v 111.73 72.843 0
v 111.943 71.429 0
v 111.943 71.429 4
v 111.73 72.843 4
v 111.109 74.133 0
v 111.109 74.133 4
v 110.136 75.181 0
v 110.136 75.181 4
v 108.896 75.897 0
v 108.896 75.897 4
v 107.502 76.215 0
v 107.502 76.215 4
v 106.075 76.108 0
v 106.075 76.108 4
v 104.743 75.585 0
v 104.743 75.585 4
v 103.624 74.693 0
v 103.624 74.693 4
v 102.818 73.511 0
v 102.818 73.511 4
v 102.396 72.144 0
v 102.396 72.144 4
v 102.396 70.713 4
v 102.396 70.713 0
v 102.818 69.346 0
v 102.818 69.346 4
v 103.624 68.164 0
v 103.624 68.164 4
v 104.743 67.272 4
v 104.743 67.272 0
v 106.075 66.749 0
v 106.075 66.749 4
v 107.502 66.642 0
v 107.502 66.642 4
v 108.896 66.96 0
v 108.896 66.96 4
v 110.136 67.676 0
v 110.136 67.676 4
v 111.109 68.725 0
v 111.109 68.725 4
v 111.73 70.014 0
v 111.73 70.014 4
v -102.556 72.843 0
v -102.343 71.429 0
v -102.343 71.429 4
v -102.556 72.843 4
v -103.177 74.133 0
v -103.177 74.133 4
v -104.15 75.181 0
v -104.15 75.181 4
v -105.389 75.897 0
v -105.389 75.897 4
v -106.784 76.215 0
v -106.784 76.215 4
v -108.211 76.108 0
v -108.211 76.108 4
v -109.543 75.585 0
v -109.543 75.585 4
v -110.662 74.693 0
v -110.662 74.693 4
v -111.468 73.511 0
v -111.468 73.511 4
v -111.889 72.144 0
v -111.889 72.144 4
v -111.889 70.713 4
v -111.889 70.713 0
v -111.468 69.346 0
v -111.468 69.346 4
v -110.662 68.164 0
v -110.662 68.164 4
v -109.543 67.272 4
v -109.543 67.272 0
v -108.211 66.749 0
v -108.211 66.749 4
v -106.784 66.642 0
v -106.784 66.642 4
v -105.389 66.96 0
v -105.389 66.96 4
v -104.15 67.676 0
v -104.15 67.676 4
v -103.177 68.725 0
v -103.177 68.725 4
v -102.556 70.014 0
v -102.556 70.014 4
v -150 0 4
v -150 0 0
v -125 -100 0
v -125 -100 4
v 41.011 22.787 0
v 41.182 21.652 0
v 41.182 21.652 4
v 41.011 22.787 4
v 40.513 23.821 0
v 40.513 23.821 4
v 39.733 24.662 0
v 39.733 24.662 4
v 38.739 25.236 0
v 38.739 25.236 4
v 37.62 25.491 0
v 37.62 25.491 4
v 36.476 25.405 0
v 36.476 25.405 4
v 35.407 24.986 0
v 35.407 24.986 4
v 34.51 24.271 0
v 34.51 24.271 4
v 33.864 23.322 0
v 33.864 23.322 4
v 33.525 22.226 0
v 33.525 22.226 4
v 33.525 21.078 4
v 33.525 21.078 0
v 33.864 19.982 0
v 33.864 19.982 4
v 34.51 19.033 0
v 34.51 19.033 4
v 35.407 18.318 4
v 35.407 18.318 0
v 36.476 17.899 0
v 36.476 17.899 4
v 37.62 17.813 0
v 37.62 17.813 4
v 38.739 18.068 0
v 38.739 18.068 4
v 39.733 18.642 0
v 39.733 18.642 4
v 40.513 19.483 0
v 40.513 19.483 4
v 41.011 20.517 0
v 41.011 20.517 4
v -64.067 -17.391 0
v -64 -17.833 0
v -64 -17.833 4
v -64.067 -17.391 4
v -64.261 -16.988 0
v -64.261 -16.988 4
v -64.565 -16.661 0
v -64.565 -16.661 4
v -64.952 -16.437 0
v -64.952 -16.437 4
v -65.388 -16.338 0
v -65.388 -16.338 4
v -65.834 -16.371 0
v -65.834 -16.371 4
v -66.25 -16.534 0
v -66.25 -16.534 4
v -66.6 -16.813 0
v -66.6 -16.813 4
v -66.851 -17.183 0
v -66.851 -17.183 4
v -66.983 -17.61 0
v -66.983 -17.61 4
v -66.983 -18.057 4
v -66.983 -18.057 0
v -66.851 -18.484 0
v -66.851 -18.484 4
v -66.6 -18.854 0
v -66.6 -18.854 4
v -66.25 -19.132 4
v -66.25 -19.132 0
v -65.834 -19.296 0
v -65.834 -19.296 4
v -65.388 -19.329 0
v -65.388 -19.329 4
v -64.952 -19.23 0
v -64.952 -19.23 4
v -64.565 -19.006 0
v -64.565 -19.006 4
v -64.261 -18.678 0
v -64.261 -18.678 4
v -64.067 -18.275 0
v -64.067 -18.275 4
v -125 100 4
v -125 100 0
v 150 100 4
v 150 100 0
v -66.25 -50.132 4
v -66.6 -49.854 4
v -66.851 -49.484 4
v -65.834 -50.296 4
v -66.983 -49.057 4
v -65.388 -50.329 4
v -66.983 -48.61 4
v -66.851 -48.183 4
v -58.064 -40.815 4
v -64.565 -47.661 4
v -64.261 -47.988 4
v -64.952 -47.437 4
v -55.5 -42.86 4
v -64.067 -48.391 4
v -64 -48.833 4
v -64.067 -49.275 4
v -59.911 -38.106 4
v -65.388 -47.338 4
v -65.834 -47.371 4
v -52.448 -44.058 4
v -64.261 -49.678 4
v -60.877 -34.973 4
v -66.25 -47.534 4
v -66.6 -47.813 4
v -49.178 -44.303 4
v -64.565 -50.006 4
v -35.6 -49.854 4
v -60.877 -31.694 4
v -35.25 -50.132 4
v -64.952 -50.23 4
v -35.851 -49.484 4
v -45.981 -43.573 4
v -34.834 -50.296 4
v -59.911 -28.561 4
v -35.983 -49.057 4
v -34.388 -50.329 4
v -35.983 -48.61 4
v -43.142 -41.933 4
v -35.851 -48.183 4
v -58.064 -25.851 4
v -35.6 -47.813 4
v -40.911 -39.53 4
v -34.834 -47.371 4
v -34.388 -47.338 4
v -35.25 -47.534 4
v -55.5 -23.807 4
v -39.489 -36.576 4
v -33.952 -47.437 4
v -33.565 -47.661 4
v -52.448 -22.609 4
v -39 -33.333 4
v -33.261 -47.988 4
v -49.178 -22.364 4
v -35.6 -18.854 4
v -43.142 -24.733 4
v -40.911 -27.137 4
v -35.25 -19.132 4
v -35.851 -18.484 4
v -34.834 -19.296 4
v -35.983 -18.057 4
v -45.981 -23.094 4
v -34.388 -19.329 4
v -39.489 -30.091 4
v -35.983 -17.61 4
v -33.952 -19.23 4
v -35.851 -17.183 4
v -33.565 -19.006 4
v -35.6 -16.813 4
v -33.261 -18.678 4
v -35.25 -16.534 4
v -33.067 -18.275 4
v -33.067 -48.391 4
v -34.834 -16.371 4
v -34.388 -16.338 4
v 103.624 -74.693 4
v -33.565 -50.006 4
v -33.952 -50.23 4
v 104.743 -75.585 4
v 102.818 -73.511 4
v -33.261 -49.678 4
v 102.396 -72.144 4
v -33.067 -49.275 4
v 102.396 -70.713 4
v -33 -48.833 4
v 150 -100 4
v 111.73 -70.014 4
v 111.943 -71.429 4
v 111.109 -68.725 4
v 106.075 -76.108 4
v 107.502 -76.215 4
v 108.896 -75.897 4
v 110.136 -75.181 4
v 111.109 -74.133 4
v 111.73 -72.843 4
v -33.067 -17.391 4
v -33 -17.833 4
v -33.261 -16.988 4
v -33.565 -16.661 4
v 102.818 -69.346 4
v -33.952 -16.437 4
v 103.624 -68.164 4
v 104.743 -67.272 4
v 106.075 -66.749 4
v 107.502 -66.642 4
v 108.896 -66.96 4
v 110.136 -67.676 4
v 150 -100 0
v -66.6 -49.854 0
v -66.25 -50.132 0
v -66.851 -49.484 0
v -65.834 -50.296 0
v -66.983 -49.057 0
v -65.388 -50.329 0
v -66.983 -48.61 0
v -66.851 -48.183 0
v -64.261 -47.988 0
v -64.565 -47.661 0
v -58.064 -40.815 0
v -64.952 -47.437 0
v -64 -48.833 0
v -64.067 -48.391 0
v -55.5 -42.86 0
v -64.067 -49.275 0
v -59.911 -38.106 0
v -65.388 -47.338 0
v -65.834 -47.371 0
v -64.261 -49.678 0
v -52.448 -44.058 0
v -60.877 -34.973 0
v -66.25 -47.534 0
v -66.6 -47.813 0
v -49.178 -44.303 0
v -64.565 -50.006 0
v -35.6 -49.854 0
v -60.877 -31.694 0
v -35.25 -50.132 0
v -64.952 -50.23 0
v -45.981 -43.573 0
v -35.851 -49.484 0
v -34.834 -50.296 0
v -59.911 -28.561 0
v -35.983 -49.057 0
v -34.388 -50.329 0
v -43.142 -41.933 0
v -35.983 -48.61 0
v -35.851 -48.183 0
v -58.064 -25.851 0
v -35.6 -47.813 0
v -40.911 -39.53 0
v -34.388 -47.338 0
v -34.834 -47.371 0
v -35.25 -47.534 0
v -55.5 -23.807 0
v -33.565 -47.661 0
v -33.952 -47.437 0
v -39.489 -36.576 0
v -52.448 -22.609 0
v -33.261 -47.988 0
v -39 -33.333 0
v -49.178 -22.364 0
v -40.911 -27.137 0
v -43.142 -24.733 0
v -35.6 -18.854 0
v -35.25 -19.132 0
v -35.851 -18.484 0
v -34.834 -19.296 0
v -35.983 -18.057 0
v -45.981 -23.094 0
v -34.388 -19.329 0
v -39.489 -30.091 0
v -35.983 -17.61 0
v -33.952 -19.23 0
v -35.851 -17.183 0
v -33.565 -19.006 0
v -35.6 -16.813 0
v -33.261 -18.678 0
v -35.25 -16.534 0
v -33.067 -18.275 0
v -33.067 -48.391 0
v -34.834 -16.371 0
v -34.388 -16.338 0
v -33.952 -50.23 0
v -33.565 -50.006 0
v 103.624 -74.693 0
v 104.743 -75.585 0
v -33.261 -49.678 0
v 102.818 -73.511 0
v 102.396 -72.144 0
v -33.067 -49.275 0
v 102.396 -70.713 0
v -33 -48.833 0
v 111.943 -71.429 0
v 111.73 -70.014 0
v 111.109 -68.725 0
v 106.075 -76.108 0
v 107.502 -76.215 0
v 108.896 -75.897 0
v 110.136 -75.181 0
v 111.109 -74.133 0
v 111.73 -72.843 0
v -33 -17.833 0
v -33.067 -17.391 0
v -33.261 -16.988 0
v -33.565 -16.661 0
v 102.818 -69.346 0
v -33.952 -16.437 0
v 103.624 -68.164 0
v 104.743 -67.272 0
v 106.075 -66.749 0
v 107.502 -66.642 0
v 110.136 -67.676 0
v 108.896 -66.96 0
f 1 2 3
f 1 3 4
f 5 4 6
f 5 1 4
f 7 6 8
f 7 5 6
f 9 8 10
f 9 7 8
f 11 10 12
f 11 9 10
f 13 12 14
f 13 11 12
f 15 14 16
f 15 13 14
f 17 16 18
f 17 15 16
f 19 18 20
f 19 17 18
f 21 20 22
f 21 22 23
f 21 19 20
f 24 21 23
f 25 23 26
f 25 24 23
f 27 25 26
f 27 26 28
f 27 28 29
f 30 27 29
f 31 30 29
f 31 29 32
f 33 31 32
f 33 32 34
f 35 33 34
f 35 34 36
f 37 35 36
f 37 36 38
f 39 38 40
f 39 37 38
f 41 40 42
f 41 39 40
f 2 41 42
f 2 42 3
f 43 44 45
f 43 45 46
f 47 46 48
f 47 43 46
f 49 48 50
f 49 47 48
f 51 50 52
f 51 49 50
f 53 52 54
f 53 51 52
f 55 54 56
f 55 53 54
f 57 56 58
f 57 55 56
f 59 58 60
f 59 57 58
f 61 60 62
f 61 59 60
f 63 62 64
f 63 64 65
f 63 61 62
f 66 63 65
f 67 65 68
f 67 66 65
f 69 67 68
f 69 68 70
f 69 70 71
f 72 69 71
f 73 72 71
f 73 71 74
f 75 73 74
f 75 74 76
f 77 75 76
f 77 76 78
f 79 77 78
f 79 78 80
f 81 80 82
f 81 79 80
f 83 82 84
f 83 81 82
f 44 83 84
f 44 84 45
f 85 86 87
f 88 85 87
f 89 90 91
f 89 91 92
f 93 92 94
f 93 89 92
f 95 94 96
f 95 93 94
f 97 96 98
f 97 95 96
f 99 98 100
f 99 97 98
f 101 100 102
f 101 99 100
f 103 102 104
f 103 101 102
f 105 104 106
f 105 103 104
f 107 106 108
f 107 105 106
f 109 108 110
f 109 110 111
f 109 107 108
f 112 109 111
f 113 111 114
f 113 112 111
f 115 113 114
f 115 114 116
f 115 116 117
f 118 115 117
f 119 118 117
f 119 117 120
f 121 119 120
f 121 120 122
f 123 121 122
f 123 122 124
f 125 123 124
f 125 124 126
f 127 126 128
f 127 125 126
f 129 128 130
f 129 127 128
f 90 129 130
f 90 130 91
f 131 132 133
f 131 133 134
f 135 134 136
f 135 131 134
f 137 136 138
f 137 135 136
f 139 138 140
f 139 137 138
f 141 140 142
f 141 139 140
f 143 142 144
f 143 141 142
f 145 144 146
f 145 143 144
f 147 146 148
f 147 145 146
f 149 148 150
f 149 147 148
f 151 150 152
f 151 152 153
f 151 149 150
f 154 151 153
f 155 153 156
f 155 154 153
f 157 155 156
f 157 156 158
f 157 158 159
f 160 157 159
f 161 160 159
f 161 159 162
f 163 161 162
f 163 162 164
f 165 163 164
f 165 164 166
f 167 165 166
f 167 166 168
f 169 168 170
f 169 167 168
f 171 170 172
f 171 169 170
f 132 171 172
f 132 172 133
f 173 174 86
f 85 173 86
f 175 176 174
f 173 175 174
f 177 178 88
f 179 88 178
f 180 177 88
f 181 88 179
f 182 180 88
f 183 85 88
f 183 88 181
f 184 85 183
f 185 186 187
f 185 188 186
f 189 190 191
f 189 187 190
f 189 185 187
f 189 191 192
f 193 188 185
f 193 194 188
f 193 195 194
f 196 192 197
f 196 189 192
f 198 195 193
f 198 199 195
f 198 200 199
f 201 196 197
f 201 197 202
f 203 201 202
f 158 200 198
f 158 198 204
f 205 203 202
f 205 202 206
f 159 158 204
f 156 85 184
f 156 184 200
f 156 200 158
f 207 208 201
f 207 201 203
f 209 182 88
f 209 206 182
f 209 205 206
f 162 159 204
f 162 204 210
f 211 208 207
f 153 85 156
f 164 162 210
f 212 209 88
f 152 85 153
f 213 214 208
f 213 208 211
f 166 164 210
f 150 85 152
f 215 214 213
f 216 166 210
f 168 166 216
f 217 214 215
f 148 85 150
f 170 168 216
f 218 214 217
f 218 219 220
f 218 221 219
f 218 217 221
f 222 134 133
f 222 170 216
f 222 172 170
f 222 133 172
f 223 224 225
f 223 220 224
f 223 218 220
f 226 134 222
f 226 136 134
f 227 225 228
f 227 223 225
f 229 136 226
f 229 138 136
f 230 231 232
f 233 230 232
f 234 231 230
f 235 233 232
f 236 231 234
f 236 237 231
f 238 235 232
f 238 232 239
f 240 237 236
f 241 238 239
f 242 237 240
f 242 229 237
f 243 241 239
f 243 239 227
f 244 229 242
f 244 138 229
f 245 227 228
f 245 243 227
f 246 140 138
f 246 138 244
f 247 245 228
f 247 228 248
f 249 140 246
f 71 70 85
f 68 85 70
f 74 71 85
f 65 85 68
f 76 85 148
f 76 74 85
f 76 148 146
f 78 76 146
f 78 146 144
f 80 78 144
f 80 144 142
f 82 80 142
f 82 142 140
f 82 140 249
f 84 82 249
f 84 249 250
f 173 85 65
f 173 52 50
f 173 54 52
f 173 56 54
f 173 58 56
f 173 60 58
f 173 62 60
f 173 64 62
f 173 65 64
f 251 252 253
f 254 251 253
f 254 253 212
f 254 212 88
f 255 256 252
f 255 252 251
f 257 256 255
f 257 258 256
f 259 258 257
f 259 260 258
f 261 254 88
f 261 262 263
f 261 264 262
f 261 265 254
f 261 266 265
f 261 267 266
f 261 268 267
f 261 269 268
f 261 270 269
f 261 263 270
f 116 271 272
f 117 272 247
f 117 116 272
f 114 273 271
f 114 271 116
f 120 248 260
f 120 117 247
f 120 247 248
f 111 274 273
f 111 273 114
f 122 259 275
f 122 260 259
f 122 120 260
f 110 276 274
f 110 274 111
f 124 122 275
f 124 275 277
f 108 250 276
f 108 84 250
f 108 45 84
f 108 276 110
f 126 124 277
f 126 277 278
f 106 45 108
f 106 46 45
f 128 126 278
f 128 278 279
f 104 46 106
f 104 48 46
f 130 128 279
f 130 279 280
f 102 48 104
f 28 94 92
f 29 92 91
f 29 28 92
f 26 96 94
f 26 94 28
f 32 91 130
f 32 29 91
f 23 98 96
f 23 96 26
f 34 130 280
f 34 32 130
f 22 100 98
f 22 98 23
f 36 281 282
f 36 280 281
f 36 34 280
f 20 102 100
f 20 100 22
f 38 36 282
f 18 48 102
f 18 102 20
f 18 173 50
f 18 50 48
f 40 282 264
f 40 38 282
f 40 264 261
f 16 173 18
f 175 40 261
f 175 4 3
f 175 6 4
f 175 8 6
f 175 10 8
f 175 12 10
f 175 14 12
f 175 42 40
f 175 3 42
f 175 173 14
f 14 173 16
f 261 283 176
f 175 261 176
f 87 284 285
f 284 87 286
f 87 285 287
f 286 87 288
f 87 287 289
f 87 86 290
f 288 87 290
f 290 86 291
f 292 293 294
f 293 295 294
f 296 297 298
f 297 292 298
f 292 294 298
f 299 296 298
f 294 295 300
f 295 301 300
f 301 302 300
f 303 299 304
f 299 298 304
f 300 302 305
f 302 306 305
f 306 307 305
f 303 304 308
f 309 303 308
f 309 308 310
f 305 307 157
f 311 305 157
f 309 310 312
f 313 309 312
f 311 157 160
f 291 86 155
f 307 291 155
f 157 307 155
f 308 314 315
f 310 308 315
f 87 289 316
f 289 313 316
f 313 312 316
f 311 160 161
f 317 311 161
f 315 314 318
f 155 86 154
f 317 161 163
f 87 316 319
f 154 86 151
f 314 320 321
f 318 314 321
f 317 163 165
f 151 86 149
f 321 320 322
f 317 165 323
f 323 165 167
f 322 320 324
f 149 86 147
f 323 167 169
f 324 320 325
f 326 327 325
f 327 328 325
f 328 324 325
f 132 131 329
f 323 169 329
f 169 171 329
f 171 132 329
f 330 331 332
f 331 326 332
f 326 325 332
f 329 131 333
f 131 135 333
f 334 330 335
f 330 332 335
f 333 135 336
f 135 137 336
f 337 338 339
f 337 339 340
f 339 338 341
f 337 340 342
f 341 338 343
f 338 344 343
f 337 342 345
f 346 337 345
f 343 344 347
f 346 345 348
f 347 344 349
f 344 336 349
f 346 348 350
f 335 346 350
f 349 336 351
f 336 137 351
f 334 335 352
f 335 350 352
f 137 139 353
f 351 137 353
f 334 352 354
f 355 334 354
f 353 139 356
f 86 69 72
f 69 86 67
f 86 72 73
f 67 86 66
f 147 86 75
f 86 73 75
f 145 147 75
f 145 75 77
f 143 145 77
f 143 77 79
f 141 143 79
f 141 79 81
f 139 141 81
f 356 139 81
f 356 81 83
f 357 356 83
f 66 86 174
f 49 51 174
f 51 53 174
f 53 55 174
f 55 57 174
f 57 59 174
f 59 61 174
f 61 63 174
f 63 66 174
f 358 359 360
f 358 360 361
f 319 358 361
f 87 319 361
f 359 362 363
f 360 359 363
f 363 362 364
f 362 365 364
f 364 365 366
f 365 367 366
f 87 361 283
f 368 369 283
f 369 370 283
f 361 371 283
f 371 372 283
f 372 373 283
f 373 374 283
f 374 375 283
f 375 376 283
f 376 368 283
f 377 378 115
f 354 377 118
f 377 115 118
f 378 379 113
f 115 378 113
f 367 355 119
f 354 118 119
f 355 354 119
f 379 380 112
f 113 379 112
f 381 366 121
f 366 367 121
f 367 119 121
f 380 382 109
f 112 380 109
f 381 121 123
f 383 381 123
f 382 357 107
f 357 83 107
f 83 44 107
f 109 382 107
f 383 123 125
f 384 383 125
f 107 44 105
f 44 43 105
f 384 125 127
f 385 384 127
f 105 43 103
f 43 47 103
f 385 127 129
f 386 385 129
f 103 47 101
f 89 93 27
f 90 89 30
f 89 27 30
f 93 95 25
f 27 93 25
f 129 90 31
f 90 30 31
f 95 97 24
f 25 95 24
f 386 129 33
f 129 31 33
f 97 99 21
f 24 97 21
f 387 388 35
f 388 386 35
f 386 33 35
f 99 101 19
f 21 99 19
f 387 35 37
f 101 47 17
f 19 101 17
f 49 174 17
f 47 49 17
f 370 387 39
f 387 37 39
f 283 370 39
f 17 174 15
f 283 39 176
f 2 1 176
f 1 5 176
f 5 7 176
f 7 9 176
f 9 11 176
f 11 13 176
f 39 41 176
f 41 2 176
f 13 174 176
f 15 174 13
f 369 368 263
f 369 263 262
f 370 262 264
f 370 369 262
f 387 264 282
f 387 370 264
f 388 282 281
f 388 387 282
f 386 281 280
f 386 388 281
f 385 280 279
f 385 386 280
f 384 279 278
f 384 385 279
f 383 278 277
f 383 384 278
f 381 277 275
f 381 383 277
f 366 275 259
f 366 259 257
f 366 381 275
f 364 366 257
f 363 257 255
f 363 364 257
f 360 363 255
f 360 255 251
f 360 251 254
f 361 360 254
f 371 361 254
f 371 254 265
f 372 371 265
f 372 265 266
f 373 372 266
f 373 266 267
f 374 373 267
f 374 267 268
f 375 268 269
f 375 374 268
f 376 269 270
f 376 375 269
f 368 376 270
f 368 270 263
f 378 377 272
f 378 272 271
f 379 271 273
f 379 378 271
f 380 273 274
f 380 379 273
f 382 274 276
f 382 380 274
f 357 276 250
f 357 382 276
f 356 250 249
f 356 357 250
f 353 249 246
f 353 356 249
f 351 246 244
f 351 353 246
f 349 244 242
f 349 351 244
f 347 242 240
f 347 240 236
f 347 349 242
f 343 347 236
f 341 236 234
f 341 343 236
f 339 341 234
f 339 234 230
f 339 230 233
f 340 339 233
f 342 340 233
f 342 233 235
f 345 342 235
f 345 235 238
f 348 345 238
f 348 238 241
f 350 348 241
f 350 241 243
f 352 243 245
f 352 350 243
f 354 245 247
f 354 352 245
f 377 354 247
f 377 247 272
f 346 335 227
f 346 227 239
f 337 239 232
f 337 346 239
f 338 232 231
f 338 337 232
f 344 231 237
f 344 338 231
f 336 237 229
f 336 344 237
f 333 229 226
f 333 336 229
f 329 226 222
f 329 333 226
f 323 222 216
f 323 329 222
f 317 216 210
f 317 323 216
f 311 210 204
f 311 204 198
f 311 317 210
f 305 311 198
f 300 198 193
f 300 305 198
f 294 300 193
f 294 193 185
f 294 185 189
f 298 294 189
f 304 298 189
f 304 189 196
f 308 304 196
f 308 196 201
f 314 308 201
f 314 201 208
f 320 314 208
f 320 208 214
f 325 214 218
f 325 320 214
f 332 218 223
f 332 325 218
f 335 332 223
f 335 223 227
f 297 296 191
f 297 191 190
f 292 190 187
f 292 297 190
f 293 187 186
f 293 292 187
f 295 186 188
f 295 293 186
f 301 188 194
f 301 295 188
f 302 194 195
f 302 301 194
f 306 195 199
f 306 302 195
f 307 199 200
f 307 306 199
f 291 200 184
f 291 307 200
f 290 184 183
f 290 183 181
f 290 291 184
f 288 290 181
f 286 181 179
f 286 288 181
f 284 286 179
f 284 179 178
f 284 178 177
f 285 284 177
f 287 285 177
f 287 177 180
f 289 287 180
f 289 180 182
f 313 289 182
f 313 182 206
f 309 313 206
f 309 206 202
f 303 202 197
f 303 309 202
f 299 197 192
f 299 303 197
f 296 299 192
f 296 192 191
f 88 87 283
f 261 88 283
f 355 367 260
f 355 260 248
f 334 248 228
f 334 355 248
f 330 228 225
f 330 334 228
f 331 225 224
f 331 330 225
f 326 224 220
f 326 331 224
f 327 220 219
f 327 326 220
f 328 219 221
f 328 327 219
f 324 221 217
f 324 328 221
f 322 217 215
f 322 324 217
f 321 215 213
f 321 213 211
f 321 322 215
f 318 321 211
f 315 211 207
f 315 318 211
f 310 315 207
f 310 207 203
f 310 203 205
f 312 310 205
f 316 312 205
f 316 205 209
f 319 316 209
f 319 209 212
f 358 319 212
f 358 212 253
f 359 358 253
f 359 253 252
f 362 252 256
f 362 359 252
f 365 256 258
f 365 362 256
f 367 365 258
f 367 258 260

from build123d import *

# Parameters (mm, degrees)
SKETCH1_R           = 1.5
SKETCH1_R_2         = 4.8
SKETCH1_R_3         = 4
BOSS_EXTRUDE1_DEPTH = 4
BOSS_EXTRUDE4_DEPTH = 4
SKETCH1_9_R         = 1.5
SKETCH1_9_R_2       = 11
BOSS_EXTRUDE5_DEPTH = 4
SKETCH1_14_R        = 4
SKETCH1_14_R_2      = 3.85
BOSS_EXTRUDE6_DEPTH = 4
SKETCH1_15_R        = 4
SKETCH1_15_R_2      = 3.85
BOSS_EXTRUDE7_DEPTH = 4


with BuildPart() as part:
    # Sketch1 → Boss-Extrude1 (new body)
    with BuildSketch(Plane.XY):
        Polygon((-125, -100), (150, -100), (150, 100), (-125, 100), (-150, 0), align=None)
        with Locations((-100, -83.333333333)):
            Circle(SKETCH1_R, mode=Mode.SUBTRACT)
        with BuildLine():
            ThreePointArc((-28.85, 11.97315075), (-8.649816618, -5.22350704), (-0.090081146, -30.333333333))
            ThreePointArc((-0.090081146, -30.333333333), (-0.02252536, -31.832657268), (0, -33.333333333))
            ThreePointArc((0, -33.333333333), (-0.02252536, -34.834009399), (-0.090081146, -36.333333333))
            ThreePointArc((-0.090081146, -36.333333333), (-8.649816618, -61.443159627), (-28.85, -78.639817417))
            ThreePointArc((-28.85, -78.639817417), (-50, -83.333333333), (-71.15, -78.639817417))
            ThreePointArc((-71.15, -78.639817417), (-91.350183382, -61.443159627), (-99.909918854, -36.333333333))
            ThreePointArc((-99.909918854, -36.333333333), (-100, -33.333333333), (-99.909918854, -30.333333333))
            ThreePointArc((-99.909918854, -30.333333333), (-91.350183382, -5.22350704), (-71.15, 11.97315075))
            ThreePointArc((-71.15, 11.97315075), (-50, 16.666666667), (-28.85, 11.97315075))
        make_face(mode=Mode.SUBTRACT)
        with Locations((0, -83.333333333)):
            Circle(SKETCH1_R, mode=Mode.SUBTRACT)
        with Locations((107.142857143, -71.428571429)):
            Circle(SKETCH1_R_2, mode=Mode.SUBTRACT)
        with Locations((-100, 16.666666667)):
            Circle(SKETCH1_R, mode=Mode.SUBTRACT)
        with Locations((-107.142857143, 71.428571429)):
            Circle(SKETCH1_R_2, mode=Mode.SUBTRACT)
        with Locations((21.832408692, 6.152026506)):
            Circle(SKETCH1_R, mode=Mode.SUBTRACT)
        with Locations((0, 16.666666667)):
            Circle(SKETCH1_R, mode=Mode.SUBTRACT)
        with Locations((37.332408692, 21.652026506)):
            Circle(SKETCH1_R_3, mode=Mode.SUBTRACT)
        with Locations((52.832408692, 6.152026506)):
            Circle(SKETCH1_R, mode=Mode.SUBTRACT)
        with Locations((21.832408692, 37.152026506)):
            Circle(SKETCH1_R, mode=Mode.SUBTRACT)
        with Locations((52.832408692, 37.152026506)):
            Circle(SKETCH1_R, mode=Mode.SUBTRACT)
        with Locations((107.142857143, 71.428571429)):
            Circle(SKETCH1_R_2, mode=Mode.SUBTRACT)
    extrude(amount=BOSS_EXTRUDE1_DEPTH)

    # Sketch1<8> → Boss-Extrude4 (add)
    with BuildSketch(Plane.XY):
        with BuildLine():
            Line((-28.85, 11.97315075), (-28.85, 0.617771214))
            ThreePointArc((-28.85, 0.617771214), (-10, -33.333333333), (-28.85, -67.284437881))
            Line((-28.85, -67.284437881), (-28.85, -78.639817417))
            ThreePointArc((-28.85, -78.639817417), (0, -33.333333333), (-28.85, 11.97315075))
        make_face()
        with BuildLine():
            ThreePointArc((-71.15, 11.97315075), (-100, -33.333333333), (-71.15, -78.639817417))
            Line((-71.15, -78.639817417), (-71.15, -67.284437881))
            ThreePointArc((-71.15, -67.284437881), (-90, -33.333333333), (-71.15, 0.617771214))
            Line((-71.15, 0.617771214), (-71.15, 11.97315075))
        make_face()
    extrude(amount=BOSS_EXTRUDE4_DEPTH)

    # Sketch1<9> → Boss-Extrude5 (add)
    # profile 1 of 9: a face of its own
    with BuildSketch(Plane.XY):
        with BuildLine():
            ThreePointArc((-28.85, 11.97315075), (-50, 16.666666667), (-71.15, 11.97315075))
            Line((-71.15, 11.97315075), (-71.15, 0.617771214))
            ThreePointArc((-71.15, 0.617771214), (-90, -33.333333333), (-71.15, -67.284437881))
            Line((-71.15, -67.284437881), (-71.15, -78.639817417))
            ThreePointArc((-71.15, -78.639817417), (-50, -83.333333333), (-28.85, -78.639817417))
            Line((-28.85, -78.639817417), (-28.85, -67.284437881))
            ThreePointArc((-28.85, -67.284437881), (-10, -33.333333333), (-28.85, 0.617771214))
            Line((-28.85, 0.617771214), (-28.85, 11.97315075))
        make_face()
        with Locations((-34.5, -17.833333333)):
            Circle(SKETCH1_9_R, mode=Mode.SUBTRACT)
        with Locations((-65.5, -48.833333333)):
            Circle(SKETCH1_9_R, mode=Mode.SUBTRACT)
        with Locations((-50, -33.333333333)):
            Circle(SKETCH1_9_R_2, mode=Mode.SUBTRACT)
        with Locations((-34.5, -48.833333333)):
            Circle(SKETCH1_9_R, mode=Mode.SUBTRACT)
        with Locations((-65.5, -17.833333333)):
            Circle(SKETCH1_9_R, mode=Mode.SUBTRACT)
    # profile 2 of 9: a face of its own
    with BuildSketch(Plane.XY):
        with Locations((21.832408692, 37.152026506)):
            Circle(SKETCH1_9_R)
    # profile 3 of 9: a face of its own
    with BuildSketch(Plane.XY):
        with Locations((52.832408692, 37.152026506)):
            Circle(SKETCH1_9_R)
    # profile 4 of 9: a face of its own
    with BuildSketch(Plane.XY):
        with Locations((52.832408692, 6.152026506)):
            Circle(SKETCH1_9_R)
    # profile 5 of 9: a face of its own
    with BuildSketch(Plane.XY):
        with Locations((21.832408692, 6.152026506)):
            Circle(SKETCH1_9_R)
    # profile 6 of 9: a face of its own
    with BuildSketch(Plane.XY):
        with Locations((-100, 16.666666667)):
            Circle(SKETCH1_9_R)
    # profile 7 of 9: a face of its own
    with BuildSketch(Plane.XY):
        with Locations((0, 16.666666667)):
            Circle(SKETCH1_9_R)
    # profile 8 of 9: a face of its own
    with BuildSketch(Plane.XY):
        with Locations((0, -83.333333333)):
            Circle(SKETCH1_9_R)
    # profile 9 of 9: a face of its own
    with BuildSketch(Plane.XY):
        with Locations((-100, -83.333333333)):
            Circle(SKETCH1_9_R)
    extrude(amount=BOSS_EXTRUDE5_DEPTH)

    # Sketch1<14> → Boss-Extrude6 (add)
    with BuildSketch(Plane.XY):
        with Locations((37.332408692, 21.652026506)):
            Circle(SKETCH1_14_R)
        with Locations((37.332408692, 21.652026506)):
            Circle(SKETCH1_14_R_2, mode=Mode.SUBTRACT)
    extrude(amount=BOSS_EXTRUDE6_DEPTH)

    # Sketch1<15> → Boss-Extrude7 (add)
    with BuildSketch(Plane.XY):
        with Locations((37.332408692, 21.652026506)):
            Circle(SKETCH1_15_R)
        with Locations((37.332408692, 21.652026506)):
            Circle(SKETCH1_15_R_2, mode=Mode.SUBTRACT)
    extrude(amount=BOSS_EXTRUDE7_DEPTH)


solid = part.part
